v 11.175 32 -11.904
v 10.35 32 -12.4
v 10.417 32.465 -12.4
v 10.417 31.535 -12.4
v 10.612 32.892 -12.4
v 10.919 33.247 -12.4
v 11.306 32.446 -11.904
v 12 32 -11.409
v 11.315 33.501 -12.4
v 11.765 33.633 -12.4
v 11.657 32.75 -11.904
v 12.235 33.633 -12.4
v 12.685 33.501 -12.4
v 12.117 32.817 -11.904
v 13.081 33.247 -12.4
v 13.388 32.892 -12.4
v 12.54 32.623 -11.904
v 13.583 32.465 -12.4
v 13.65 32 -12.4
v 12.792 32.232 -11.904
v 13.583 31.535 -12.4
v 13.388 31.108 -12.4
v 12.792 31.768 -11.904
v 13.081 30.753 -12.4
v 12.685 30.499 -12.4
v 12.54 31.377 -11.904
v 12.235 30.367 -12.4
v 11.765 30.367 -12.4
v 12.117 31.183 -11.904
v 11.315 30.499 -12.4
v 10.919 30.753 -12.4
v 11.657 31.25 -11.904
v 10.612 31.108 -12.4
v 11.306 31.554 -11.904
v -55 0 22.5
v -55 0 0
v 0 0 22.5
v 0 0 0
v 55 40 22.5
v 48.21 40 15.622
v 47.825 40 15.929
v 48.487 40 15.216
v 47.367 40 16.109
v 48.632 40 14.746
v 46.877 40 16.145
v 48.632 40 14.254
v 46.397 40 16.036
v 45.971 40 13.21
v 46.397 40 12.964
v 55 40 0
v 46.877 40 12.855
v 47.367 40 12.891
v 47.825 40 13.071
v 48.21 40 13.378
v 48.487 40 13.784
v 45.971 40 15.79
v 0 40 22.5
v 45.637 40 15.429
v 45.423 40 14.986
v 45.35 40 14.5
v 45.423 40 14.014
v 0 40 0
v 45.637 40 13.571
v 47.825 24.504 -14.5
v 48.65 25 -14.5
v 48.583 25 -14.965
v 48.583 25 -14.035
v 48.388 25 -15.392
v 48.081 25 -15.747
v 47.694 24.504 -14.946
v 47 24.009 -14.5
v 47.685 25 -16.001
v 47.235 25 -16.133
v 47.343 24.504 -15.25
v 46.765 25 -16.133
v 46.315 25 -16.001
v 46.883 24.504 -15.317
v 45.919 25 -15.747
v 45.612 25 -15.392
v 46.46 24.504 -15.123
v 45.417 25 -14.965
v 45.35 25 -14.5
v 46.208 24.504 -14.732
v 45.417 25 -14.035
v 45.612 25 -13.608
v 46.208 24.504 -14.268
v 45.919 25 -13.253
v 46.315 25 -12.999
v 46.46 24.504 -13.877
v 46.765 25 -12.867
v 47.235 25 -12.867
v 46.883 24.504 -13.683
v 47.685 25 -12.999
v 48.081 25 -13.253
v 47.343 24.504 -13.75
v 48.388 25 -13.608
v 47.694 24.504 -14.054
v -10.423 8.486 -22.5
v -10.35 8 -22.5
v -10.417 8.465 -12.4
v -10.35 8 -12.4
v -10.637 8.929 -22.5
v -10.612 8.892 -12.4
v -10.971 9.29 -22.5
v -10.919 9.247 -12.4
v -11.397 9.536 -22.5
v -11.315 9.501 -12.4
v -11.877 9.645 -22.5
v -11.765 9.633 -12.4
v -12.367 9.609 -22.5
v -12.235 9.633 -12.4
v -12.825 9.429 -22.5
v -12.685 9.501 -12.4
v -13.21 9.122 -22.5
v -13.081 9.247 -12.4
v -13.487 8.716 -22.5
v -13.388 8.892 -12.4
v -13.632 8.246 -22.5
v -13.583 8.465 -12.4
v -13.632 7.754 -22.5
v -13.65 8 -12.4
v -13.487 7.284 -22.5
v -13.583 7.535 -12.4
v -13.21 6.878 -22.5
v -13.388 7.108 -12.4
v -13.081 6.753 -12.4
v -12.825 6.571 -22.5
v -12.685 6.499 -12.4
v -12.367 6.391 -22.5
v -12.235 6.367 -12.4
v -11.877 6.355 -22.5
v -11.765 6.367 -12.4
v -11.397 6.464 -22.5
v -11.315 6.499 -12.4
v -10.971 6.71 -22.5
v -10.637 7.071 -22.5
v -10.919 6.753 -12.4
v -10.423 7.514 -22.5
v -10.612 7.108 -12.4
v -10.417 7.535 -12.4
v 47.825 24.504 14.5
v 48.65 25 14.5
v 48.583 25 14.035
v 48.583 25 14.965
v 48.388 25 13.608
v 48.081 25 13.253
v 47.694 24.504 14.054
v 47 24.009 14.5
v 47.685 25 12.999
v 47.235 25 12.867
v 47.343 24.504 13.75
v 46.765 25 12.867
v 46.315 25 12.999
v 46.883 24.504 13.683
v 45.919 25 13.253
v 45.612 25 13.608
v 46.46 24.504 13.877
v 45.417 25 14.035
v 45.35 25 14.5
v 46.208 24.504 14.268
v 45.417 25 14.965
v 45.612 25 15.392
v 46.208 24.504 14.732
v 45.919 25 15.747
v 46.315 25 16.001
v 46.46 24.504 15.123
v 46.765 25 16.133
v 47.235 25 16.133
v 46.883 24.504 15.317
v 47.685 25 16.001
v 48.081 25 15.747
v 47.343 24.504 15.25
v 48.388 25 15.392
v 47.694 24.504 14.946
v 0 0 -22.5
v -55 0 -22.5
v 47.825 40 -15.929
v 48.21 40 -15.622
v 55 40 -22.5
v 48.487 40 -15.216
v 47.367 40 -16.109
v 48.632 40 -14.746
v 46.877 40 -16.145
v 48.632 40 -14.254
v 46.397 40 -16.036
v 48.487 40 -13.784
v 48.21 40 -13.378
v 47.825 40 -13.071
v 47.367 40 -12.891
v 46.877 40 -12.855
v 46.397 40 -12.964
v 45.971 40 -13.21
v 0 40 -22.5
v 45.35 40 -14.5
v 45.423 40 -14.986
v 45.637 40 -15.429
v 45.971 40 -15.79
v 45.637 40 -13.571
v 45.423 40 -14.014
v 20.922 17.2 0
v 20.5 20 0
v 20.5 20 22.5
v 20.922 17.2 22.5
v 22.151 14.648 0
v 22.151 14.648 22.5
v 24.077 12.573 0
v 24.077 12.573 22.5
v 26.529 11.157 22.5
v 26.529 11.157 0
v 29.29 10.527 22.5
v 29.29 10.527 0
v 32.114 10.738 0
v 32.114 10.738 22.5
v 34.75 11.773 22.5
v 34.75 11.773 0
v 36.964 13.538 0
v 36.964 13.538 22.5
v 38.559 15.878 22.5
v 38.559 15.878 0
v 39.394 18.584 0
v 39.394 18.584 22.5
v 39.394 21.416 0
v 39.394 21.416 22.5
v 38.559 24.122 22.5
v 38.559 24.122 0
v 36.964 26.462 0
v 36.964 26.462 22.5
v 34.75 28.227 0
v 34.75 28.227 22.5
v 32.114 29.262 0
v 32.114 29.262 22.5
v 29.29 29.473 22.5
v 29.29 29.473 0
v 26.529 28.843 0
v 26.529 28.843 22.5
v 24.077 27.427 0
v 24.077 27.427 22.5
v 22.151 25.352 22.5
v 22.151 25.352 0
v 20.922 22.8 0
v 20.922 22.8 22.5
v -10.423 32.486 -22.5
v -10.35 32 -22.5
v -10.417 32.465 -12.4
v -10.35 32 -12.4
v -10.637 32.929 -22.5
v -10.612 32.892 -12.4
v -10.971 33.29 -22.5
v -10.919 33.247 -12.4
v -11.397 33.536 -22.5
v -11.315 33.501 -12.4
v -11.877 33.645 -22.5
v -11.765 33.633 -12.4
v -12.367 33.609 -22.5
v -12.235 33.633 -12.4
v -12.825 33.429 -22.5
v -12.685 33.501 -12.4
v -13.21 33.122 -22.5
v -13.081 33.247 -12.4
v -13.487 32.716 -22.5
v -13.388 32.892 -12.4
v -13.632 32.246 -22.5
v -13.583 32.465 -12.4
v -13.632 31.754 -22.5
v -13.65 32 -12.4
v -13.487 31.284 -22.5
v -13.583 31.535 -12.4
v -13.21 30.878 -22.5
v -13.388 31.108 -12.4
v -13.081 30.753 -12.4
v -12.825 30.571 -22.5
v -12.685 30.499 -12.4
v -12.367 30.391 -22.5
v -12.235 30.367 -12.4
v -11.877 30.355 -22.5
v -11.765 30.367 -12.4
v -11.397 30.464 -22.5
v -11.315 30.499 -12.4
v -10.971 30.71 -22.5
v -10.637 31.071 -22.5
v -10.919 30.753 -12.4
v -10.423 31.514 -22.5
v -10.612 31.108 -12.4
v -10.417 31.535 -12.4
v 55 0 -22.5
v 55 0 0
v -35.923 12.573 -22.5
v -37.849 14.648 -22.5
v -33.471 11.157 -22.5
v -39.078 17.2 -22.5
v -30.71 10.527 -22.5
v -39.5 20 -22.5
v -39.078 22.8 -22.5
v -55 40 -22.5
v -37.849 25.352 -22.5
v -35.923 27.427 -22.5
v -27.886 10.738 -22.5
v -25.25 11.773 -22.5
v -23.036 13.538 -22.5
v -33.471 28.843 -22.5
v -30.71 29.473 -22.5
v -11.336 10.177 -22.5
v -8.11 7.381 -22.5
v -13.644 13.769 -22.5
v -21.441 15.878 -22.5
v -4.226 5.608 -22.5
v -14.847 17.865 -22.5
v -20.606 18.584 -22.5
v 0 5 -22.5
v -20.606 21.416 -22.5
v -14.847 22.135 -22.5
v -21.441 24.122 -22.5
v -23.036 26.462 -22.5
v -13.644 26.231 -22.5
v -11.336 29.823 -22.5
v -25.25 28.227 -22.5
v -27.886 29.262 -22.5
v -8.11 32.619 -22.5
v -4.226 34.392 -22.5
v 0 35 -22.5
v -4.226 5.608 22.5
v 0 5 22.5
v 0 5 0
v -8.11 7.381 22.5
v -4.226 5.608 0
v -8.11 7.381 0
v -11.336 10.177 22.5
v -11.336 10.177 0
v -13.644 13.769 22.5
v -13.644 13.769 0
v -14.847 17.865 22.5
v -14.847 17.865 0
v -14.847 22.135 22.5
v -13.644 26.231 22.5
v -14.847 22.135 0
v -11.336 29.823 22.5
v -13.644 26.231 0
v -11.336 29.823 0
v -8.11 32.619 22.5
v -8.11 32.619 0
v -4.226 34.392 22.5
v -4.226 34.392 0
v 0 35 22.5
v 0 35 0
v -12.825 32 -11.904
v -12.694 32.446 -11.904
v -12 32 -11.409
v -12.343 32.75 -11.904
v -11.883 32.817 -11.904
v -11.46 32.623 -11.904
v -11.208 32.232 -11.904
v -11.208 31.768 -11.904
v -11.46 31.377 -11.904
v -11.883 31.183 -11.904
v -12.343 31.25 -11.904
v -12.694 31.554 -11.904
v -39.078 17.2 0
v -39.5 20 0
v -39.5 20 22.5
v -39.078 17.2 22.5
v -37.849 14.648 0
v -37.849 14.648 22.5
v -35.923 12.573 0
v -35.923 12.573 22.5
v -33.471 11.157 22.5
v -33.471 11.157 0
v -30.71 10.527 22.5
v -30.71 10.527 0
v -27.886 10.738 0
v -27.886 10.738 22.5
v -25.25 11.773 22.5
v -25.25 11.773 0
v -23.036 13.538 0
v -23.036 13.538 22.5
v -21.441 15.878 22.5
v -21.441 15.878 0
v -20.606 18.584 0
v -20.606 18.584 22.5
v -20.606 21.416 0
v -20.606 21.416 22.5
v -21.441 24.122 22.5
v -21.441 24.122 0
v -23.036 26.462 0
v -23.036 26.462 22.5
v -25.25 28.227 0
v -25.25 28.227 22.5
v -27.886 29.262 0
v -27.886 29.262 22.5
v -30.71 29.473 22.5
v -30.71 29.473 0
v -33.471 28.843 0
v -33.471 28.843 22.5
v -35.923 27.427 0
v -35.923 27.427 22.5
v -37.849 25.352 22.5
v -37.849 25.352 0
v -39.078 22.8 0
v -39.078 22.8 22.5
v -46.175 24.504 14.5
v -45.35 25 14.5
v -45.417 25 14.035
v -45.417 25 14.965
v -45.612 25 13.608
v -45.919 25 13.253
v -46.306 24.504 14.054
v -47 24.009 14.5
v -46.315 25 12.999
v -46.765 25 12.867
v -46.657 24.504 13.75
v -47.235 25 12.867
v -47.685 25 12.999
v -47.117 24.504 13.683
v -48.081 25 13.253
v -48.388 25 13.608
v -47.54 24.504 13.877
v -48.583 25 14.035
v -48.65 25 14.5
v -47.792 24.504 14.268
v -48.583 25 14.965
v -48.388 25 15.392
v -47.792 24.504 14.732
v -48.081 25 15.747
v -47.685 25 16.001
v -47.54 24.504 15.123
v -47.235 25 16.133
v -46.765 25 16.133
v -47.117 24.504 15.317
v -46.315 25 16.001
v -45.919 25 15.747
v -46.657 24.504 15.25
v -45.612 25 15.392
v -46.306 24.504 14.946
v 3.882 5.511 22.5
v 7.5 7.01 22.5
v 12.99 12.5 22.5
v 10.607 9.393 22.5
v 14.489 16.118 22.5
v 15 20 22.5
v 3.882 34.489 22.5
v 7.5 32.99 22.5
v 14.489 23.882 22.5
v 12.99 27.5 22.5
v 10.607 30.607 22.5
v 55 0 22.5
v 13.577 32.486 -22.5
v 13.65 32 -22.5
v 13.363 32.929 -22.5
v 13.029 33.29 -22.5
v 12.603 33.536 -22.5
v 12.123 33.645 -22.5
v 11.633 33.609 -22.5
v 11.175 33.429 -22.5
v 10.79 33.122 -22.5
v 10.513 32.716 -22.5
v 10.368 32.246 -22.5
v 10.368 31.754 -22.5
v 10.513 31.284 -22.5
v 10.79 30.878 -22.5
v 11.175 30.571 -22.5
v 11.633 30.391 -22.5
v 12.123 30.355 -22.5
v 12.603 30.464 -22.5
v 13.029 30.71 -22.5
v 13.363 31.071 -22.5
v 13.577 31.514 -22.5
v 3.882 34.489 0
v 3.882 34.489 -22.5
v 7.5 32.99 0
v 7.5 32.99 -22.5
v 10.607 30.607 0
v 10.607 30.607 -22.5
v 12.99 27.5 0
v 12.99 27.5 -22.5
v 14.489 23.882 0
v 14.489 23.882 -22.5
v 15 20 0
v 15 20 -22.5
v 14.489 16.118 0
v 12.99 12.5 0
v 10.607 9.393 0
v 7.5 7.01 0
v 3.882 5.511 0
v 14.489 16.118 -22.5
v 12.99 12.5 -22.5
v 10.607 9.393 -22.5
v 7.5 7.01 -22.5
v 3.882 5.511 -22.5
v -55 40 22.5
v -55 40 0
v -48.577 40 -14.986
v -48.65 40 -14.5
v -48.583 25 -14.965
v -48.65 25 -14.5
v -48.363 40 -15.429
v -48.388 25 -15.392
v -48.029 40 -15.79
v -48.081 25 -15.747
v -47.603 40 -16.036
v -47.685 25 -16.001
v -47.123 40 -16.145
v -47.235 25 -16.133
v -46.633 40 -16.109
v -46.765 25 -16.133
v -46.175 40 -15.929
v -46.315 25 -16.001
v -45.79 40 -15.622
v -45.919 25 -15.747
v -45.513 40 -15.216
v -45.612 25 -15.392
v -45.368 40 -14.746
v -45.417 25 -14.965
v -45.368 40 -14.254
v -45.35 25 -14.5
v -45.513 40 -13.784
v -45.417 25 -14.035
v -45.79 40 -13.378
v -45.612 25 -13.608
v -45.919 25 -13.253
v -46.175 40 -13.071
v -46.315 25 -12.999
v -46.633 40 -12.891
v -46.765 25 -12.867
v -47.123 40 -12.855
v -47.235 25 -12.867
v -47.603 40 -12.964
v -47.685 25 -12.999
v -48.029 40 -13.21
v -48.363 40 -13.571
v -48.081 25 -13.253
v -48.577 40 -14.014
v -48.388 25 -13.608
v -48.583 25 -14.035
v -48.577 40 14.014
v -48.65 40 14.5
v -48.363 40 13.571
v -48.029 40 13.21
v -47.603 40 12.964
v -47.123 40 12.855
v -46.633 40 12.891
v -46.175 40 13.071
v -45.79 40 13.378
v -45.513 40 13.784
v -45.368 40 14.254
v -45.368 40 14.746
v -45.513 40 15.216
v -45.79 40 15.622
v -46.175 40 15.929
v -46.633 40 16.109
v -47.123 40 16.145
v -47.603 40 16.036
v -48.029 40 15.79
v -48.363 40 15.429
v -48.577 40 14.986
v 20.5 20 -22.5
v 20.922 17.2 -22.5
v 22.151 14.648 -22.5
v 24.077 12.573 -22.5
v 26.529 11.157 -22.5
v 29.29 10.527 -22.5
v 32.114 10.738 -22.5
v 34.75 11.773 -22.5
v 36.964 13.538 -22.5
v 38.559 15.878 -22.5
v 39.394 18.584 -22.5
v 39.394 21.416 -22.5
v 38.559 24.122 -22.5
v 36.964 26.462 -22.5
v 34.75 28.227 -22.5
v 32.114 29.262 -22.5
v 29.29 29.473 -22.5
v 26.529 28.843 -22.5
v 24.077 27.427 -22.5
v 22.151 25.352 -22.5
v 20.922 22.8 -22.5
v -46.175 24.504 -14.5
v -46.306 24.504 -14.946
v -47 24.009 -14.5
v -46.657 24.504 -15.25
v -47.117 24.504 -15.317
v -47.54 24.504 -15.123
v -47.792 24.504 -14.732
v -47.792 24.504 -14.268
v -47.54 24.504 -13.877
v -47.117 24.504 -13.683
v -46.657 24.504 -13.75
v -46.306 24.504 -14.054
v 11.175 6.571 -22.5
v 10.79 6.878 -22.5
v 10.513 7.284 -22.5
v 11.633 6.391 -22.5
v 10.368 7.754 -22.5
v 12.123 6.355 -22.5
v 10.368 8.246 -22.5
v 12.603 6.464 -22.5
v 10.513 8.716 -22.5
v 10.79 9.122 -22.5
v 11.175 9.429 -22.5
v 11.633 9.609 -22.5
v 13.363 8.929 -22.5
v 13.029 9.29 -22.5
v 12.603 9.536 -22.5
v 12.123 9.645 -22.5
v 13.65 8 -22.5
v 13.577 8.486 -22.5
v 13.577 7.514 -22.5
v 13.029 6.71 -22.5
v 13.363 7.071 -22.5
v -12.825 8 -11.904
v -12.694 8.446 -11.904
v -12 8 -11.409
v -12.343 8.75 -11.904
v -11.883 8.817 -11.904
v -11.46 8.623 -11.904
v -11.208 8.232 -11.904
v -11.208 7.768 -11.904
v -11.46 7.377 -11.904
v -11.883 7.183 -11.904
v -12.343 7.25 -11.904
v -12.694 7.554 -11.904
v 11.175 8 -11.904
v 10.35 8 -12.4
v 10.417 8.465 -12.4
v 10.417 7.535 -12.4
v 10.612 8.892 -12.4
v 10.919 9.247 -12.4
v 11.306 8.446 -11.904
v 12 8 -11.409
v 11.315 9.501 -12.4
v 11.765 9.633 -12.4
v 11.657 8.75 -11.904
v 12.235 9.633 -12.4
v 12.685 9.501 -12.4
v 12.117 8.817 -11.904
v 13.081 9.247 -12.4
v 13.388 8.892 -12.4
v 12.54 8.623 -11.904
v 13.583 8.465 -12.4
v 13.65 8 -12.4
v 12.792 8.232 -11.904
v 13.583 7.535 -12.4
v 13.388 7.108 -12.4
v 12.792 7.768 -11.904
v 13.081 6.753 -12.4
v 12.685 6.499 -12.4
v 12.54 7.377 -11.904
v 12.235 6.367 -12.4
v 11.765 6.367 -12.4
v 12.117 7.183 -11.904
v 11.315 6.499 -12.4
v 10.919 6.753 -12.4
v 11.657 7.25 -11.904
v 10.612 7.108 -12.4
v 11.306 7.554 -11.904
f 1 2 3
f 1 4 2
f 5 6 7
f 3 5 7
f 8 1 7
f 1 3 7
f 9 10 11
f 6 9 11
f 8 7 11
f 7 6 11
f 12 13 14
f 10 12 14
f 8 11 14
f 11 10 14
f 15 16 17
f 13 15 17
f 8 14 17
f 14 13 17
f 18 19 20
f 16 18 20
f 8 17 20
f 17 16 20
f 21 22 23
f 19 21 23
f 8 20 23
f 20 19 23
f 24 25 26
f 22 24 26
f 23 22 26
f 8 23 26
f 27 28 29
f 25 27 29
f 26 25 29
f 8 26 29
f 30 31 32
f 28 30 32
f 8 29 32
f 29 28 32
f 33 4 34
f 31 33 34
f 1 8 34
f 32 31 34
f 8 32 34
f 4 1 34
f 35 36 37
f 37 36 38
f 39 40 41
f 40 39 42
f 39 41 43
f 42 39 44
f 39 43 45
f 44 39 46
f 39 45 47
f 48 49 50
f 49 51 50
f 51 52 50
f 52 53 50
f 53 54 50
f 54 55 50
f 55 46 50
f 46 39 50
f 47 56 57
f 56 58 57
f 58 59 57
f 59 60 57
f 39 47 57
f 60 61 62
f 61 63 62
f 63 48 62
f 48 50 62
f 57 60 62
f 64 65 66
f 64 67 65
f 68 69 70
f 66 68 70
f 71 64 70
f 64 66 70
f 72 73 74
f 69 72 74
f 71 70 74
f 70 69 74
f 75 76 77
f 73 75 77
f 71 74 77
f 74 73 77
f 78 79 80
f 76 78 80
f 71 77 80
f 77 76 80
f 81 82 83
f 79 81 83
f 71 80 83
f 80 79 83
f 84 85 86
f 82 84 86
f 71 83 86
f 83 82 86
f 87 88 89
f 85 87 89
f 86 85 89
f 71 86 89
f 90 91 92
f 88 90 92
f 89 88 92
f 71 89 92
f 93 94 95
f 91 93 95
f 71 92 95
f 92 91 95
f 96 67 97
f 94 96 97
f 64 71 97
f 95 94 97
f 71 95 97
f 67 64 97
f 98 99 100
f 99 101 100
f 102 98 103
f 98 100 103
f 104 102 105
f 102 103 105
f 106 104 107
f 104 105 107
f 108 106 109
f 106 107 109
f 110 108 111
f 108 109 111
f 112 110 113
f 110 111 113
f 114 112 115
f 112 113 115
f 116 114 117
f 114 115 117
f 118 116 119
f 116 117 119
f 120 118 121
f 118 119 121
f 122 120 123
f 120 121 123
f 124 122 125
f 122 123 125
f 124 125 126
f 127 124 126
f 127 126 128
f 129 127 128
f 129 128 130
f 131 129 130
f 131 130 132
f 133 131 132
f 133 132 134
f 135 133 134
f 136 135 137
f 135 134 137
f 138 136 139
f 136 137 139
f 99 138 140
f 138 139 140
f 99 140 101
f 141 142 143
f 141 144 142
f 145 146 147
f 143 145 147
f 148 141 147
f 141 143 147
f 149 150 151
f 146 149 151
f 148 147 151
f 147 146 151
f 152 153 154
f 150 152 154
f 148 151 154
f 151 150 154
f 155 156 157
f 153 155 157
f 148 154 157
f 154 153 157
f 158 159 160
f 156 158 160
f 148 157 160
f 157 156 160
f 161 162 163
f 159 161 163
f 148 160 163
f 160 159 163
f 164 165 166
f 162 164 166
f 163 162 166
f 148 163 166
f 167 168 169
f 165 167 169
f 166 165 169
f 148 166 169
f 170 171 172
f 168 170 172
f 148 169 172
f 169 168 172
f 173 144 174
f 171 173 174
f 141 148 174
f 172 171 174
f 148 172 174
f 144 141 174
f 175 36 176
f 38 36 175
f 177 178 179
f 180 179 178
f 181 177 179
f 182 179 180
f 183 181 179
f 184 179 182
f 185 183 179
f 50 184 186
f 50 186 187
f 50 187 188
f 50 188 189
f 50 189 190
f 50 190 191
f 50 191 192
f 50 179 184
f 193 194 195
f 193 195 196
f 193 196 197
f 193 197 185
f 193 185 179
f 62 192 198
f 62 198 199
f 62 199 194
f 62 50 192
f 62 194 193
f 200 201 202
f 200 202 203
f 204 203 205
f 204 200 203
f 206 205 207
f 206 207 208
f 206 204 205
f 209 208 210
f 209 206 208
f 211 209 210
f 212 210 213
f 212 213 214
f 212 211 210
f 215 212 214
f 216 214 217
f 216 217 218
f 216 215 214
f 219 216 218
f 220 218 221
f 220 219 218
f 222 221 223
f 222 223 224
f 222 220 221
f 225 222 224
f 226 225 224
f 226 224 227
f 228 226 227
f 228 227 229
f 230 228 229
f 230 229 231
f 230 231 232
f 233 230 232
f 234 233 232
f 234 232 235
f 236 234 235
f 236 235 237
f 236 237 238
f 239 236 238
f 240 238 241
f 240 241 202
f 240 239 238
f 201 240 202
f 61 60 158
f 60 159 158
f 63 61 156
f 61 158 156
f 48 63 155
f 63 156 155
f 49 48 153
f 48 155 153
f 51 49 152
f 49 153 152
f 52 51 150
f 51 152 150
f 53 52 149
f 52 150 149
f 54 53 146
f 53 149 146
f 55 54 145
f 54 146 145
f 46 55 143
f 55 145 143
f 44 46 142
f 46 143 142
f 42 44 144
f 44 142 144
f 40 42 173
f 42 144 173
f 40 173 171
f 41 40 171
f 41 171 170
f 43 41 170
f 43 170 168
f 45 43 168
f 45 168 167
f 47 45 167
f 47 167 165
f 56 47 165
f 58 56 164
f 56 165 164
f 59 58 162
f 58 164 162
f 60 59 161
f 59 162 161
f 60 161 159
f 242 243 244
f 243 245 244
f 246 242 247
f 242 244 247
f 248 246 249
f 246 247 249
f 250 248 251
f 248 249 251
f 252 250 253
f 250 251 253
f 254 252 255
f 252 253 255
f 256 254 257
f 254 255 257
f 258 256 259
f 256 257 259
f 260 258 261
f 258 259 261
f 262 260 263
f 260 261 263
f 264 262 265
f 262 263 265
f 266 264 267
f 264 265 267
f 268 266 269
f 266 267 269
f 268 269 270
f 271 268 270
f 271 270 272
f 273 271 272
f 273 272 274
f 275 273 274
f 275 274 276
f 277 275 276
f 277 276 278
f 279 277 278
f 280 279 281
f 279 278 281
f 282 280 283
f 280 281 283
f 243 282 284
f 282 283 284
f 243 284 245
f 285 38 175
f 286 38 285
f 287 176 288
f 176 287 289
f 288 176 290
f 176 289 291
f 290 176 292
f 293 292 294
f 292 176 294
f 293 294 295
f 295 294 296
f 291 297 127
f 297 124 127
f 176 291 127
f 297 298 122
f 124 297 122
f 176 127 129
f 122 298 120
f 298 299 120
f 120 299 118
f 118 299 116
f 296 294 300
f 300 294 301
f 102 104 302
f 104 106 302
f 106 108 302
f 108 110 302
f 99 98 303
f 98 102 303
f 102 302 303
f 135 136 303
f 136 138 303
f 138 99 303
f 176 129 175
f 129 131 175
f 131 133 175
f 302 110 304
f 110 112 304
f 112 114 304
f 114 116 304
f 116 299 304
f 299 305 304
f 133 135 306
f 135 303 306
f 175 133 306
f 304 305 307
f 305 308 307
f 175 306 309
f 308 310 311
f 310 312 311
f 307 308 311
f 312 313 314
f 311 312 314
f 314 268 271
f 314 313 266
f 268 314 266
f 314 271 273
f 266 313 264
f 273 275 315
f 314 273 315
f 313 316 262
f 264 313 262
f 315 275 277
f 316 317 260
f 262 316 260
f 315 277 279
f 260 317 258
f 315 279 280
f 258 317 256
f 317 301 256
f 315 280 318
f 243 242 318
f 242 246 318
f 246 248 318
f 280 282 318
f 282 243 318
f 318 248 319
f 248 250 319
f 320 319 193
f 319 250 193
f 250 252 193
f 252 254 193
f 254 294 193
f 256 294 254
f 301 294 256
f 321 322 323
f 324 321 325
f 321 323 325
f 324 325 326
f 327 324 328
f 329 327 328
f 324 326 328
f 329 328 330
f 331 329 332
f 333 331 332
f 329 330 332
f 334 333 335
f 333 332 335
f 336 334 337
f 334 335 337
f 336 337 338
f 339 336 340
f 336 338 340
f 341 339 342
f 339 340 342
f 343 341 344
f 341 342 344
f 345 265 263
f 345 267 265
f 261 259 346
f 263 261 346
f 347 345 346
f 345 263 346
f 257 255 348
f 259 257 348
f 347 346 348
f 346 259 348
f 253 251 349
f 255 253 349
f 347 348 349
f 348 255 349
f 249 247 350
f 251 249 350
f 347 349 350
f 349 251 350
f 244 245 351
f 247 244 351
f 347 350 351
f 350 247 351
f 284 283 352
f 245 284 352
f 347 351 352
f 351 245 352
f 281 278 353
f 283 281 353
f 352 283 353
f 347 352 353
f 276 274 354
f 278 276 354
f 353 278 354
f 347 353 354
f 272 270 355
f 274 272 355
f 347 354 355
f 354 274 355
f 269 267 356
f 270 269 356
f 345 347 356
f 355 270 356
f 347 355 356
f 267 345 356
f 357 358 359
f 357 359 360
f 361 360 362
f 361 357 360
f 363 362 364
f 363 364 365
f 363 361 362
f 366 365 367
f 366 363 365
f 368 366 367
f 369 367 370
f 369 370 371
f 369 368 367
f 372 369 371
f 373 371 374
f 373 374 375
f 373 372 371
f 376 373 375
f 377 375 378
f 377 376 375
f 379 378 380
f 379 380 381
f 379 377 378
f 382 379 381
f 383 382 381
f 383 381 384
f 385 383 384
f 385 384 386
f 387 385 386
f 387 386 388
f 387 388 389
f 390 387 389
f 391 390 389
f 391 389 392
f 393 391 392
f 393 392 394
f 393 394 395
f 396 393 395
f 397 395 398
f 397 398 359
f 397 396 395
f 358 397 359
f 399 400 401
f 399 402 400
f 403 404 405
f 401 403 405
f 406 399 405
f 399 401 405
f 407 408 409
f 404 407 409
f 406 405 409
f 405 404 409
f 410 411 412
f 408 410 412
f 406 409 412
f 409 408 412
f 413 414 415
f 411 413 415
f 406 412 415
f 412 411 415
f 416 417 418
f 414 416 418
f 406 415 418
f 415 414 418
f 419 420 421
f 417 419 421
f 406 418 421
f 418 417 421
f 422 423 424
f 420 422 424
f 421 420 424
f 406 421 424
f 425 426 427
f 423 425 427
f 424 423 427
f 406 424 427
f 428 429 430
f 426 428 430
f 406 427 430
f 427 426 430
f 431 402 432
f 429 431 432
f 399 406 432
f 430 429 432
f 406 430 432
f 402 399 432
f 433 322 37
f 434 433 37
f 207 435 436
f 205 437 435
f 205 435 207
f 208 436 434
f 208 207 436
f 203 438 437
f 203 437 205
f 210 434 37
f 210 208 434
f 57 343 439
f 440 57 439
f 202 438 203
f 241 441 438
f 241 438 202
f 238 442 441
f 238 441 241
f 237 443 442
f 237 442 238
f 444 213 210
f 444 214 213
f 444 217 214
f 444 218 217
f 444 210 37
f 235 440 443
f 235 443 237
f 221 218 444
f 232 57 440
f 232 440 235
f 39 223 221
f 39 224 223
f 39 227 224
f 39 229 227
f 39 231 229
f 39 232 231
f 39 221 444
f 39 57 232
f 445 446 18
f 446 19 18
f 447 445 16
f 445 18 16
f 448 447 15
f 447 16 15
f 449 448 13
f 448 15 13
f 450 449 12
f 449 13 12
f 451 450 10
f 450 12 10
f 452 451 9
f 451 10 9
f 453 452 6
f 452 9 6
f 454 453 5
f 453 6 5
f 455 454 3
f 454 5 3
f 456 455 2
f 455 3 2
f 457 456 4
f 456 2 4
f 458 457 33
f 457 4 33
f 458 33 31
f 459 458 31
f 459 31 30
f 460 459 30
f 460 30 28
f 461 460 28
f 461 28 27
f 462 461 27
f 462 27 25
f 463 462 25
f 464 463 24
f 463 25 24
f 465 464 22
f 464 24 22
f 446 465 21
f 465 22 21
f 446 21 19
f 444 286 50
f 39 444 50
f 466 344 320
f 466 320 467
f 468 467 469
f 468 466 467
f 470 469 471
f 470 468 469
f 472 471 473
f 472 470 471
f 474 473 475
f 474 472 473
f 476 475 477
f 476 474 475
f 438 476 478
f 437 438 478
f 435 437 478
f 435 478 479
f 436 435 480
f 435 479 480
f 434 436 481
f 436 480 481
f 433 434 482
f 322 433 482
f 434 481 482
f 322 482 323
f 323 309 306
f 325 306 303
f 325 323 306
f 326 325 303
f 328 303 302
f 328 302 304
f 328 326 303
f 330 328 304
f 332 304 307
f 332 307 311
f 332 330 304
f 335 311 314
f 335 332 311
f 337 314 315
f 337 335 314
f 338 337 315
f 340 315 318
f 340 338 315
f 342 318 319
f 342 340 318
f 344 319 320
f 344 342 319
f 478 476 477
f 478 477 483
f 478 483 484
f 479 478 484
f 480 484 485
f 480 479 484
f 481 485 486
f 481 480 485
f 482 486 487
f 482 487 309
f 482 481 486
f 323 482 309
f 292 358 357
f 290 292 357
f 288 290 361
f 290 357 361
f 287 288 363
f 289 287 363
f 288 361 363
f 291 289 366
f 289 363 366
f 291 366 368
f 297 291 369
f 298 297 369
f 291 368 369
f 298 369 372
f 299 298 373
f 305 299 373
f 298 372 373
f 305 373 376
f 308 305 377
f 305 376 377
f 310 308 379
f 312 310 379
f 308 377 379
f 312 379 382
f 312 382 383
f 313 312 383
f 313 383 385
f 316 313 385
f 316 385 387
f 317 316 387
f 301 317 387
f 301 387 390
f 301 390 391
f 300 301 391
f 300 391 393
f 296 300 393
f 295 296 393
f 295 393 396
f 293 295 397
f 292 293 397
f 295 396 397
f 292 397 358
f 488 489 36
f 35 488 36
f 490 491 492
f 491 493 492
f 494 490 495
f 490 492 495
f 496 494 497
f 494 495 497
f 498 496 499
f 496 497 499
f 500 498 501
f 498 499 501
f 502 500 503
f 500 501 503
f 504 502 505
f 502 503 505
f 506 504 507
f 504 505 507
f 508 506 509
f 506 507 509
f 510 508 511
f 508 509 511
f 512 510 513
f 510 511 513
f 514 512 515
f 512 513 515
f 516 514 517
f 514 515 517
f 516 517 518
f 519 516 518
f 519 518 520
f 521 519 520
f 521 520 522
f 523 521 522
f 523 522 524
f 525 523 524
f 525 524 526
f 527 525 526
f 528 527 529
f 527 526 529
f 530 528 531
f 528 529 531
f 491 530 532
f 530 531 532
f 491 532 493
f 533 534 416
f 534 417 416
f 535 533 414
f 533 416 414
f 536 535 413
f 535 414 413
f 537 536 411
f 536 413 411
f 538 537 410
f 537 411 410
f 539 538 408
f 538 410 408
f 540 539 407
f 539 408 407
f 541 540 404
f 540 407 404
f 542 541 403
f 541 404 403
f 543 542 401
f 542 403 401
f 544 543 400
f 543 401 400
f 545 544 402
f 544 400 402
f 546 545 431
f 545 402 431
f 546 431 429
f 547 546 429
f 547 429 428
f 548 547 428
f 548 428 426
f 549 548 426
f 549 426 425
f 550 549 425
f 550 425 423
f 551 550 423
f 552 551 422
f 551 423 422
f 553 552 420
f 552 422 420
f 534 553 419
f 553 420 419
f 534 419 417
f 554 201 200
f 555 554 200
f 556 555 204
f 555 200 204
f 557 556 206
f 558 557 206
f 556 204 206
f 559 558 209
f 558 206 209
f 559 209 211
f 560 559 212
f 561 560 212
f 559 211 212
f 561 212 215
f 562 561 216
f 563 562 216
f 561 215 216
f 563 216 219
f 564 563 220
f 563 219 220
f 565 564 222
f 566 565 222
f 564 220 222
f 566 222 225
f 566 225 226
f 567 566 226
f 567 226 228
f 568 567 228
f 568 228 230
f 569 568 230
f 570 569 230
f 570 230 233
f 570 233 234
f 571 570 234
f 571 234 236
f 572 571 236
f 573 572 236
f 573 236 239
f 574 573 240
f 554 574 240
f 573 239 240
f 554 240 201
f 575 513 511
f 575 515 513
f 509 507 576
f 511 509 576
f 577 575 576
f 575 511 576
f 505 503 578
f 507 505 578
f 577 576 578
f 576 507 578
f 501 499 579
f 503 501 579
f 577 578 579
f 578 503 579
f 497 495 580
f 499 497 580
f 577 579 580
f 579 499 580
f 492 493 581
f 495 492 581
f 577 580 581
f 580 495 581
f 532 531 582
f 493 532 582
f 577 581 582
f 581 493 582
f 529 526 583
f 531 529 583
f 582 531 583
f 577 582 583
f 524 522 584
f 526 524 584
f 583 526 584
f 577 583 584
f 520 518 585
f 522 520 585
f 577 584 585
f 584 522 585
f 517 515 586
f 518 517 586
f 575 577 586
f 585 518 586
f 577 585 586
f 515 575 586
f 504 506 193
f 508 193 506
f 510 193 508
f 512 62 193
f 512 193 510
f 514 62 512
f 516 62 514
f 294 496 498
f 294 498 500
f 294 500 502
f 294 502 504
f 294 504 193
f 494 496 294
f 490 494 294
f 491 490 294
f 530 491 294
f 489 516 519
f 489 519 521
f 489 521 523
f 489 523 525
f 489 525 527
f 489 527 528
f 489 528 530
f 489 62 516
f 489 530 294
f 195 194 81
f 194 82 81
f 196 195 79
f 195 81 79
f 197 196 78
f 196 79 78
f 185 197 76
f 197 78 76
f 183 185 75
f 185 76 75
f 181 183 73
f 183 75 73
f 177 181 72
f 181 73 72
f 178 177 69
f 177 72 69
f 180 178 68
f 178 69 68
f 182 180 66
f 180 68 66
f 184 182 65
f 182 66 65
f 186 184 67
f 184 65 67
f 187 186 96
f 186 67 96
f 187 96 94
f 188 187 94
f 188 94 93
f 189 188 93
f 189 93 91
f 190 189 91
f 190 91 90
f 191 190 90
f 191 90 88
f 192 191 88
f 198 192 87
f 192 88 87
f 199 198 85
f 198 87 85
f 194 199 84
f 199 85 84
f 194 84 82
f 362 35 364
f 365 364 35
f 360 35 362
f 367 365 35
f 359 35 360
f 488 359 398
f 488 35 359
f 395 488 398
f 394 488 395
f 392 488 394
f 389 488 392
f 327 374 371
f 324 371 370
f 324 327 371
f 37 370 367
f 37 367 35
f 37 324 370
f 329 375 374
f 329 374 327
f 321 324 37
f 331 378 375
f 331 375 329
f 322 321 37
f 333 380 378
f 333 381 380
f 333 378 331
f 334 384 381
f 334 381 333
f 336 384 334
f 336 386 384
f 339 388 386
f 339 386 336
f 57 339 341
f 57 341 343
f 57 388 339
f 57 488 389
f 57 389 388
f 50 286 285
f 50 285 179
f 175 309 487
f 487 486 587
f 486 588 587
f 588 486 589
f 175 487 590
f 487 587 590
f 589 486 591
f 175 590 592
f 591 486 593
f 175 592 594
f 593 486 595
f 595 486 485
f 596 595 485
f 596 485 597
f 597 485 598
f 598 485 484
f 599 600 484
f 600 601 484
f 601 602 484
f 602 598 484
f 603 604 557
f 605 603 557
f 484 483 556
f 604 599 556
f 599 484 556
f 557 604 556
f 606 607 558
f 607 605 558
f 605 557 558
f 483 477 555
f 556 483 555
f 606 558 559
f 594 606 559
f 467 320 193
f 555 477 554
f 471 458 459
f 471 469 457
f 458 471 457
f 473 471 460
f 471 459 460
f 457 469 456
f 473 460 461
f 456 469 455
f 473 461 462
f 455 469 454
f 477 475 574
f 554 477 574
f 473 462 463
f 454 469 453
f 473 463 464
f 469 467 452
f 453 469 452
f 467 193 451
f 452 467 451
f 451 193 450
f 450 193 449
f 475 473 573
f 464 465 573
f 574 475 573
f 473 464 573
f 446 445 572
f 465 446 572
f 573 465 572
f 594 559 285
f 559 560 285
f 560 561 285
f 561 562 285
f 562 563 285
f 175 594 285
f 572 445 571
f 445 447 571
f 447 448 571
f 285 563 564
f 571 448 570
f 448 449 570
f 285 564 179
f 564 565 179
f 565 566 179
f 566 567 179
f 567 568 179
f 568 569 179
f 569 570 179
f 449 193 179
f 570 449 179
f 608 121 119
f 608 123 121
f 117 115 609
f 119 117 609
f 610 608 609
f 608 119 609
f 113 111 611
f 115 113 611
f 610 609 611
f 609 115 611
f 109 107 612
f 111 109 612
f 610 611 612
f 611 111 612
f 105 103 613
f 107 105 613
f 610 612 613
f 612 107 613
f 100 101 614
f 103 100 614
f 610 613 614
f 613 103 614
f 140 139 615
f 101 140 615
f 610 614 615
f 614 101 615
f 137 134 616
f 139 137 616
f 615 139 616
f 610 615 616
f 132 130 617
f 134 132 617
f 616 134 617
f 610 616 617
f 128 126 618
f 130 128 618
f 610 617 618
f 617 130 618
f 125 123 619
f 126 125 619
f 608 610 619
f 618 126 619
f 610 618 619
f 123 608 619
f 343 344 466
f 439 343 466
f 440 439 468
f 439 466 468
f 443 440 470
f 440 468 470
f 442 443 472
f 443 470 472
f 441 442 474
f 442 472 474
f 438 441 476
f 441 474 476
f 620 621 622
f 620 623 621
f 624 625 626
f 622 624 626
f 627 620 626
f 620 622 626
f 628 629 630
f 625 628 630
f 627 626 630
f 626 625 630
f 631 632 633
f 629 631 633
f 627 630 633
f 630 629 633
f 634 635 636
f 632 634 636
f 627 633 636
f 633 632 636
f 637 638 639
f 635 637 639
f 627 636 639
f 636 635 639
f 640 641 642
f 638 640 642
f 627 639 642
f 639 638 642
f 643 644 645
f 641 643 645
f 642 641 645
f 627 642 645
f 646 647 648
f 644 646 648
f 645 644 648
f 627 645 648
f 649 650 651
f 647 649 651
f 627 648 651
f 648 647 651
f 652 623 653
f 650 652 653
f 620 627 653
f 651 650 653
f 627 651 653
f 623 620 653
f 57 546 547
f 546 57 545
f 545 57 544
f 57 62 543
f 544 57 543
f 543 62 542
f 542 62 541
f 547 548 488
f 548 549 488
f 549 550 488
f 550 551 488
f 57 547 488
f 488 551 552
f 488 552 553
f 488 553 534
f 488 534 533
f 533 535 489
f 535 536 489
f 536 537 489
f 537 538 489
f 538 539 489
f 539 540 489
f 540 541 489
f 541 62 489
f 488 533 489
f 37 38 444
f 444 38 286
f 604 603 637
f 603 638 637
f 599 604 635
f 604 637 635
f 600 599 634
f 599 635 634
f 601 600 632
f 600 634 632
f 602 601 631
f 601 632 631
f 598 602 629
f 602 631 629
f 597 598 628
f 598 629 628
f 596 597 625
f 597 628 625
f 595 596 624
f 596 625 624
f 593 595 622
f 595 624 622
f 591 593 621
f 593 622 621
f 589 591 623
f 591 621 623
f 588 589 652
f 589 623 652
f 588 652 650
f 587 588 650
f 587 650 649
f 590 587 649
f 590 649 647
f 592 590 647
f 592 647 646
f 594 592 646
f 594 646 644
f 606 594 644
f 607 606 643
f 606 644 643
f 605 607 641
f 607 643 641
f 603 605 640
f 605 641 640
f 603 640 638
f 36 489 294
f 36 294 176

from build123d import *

# Parameters (mm, degrees)
SKETCH1_R             = 9.5
BOSS_EXTRUDE1_DEPTH   = 22.5
M4_TAPPED_HOLE1_D     = 3.3
M4_TAPPED_HOLE1_DEPTH = 10.1
M4_TAPPED_HOLE1_TIP   = 0.991420021
M4_TAPPED_HOLE2_D     = 3.3
M4_TAPPED_HOLE2_DEPTH = 15
M4_TAPPED_HOLE2_TIP   = 0.991420021


with BuildPart() as part:
    # Sketch1 → Boss-Extrude1 (new, symmetric)
    # profile 1 of 2: a face of its own
    with BuildSketch(Plane.XY):
        with BuildLine():
            Line((-55, 0), (0, 0))
            Line((0, 0), (0, 5))
            ThreePointArc((0, 5), (-15, 20), (0, 35))
            Line((0, 35), (0, 40))
            Line((0, 40), (-45, 40))
            Line((-45, 40), (-55, 40))
            Line((-55, 40), (-55, 0))
        make_face()
        with Locations(Location((-30, 20, 0), (0, 0, 180))):
            Circle(SKETCH1_R, mode=Mode.SUBTRACT)
    # profile 2 of 2: a face of its own
    with BuildSketch(Plane.XY):
        with BuildLine():
            Line((0, 5), (0, 0))
            Line((0, 0), (55, 0))
            Line((55, 0), (55, 40))
            Line((55, 40), (45, 40))
            Line((45, 40), (0, 40))
            Line((0, 40), (0, 35))
            ThreePointArc((0, 35), (10.606601718, 30.606601718), (15, 20))
            ThreePointArc((15, 20), (10.606601718, 9.393398282), (0, 5))
        make_face()
        with Locations(Location((30, 20, 0), (0, 0, 180))):
            Circle(SKETCH1_R, mode=Mode.SUBTRACT)
    extrude(amount=BOSS_EXTRUDE1_DEPTH, both=True)

    # M4 Tapped Hole1
    with Locations(Plane(origin=(0, 0, -22.5), x_dir=(-1, 0, 0), z_dir=(0, 0, -1))):
        with Locations((12, 32), (-12, 32), (12, 8), (-12, 8)):
            Hole(M4_TAPPED_HOLE1_D / 2, depth=M4_TAPPED_HOLE1_DEPTH)
            with Locations((0, 0, -(M4_TAPPED_HOLE1_DEPTH + M4_TAPPED_HOLE1_TIP / 2))):  # 118° drill point
                Cone(0, M4_TAPPED_HOLE1_D / 2, M4_TAPPED_HOLE1_TIP, mode=Mode.SUBTRACT)

    # M4 Tapped Hole2
    with Locations(Plane(origin=(0, 40, 0), x_dir=(1, 0, 0), z_dir=(0, 1, 0))):
        with Locations((47, 14.5), (-47, 14.5), (-47, -14.5), (47, -14.5)):
            Hole(M4_TAPPED_HOLE2_D / 2, depth=M4_TAPPED_HOLE2_DEPTH)
            with Locations((0, 0, -(M4_TAPPED_HOLE2_DEPTH + M4_TAPPED_HOLE2_TIP / 2))):  # 118° drill point
                Cone(0, M4_TAPPED_HOLE2_D / 2, M4_TAPPED_HOLE2_TIP, mode=Mode.SUBTRACT)


solid = part.part
